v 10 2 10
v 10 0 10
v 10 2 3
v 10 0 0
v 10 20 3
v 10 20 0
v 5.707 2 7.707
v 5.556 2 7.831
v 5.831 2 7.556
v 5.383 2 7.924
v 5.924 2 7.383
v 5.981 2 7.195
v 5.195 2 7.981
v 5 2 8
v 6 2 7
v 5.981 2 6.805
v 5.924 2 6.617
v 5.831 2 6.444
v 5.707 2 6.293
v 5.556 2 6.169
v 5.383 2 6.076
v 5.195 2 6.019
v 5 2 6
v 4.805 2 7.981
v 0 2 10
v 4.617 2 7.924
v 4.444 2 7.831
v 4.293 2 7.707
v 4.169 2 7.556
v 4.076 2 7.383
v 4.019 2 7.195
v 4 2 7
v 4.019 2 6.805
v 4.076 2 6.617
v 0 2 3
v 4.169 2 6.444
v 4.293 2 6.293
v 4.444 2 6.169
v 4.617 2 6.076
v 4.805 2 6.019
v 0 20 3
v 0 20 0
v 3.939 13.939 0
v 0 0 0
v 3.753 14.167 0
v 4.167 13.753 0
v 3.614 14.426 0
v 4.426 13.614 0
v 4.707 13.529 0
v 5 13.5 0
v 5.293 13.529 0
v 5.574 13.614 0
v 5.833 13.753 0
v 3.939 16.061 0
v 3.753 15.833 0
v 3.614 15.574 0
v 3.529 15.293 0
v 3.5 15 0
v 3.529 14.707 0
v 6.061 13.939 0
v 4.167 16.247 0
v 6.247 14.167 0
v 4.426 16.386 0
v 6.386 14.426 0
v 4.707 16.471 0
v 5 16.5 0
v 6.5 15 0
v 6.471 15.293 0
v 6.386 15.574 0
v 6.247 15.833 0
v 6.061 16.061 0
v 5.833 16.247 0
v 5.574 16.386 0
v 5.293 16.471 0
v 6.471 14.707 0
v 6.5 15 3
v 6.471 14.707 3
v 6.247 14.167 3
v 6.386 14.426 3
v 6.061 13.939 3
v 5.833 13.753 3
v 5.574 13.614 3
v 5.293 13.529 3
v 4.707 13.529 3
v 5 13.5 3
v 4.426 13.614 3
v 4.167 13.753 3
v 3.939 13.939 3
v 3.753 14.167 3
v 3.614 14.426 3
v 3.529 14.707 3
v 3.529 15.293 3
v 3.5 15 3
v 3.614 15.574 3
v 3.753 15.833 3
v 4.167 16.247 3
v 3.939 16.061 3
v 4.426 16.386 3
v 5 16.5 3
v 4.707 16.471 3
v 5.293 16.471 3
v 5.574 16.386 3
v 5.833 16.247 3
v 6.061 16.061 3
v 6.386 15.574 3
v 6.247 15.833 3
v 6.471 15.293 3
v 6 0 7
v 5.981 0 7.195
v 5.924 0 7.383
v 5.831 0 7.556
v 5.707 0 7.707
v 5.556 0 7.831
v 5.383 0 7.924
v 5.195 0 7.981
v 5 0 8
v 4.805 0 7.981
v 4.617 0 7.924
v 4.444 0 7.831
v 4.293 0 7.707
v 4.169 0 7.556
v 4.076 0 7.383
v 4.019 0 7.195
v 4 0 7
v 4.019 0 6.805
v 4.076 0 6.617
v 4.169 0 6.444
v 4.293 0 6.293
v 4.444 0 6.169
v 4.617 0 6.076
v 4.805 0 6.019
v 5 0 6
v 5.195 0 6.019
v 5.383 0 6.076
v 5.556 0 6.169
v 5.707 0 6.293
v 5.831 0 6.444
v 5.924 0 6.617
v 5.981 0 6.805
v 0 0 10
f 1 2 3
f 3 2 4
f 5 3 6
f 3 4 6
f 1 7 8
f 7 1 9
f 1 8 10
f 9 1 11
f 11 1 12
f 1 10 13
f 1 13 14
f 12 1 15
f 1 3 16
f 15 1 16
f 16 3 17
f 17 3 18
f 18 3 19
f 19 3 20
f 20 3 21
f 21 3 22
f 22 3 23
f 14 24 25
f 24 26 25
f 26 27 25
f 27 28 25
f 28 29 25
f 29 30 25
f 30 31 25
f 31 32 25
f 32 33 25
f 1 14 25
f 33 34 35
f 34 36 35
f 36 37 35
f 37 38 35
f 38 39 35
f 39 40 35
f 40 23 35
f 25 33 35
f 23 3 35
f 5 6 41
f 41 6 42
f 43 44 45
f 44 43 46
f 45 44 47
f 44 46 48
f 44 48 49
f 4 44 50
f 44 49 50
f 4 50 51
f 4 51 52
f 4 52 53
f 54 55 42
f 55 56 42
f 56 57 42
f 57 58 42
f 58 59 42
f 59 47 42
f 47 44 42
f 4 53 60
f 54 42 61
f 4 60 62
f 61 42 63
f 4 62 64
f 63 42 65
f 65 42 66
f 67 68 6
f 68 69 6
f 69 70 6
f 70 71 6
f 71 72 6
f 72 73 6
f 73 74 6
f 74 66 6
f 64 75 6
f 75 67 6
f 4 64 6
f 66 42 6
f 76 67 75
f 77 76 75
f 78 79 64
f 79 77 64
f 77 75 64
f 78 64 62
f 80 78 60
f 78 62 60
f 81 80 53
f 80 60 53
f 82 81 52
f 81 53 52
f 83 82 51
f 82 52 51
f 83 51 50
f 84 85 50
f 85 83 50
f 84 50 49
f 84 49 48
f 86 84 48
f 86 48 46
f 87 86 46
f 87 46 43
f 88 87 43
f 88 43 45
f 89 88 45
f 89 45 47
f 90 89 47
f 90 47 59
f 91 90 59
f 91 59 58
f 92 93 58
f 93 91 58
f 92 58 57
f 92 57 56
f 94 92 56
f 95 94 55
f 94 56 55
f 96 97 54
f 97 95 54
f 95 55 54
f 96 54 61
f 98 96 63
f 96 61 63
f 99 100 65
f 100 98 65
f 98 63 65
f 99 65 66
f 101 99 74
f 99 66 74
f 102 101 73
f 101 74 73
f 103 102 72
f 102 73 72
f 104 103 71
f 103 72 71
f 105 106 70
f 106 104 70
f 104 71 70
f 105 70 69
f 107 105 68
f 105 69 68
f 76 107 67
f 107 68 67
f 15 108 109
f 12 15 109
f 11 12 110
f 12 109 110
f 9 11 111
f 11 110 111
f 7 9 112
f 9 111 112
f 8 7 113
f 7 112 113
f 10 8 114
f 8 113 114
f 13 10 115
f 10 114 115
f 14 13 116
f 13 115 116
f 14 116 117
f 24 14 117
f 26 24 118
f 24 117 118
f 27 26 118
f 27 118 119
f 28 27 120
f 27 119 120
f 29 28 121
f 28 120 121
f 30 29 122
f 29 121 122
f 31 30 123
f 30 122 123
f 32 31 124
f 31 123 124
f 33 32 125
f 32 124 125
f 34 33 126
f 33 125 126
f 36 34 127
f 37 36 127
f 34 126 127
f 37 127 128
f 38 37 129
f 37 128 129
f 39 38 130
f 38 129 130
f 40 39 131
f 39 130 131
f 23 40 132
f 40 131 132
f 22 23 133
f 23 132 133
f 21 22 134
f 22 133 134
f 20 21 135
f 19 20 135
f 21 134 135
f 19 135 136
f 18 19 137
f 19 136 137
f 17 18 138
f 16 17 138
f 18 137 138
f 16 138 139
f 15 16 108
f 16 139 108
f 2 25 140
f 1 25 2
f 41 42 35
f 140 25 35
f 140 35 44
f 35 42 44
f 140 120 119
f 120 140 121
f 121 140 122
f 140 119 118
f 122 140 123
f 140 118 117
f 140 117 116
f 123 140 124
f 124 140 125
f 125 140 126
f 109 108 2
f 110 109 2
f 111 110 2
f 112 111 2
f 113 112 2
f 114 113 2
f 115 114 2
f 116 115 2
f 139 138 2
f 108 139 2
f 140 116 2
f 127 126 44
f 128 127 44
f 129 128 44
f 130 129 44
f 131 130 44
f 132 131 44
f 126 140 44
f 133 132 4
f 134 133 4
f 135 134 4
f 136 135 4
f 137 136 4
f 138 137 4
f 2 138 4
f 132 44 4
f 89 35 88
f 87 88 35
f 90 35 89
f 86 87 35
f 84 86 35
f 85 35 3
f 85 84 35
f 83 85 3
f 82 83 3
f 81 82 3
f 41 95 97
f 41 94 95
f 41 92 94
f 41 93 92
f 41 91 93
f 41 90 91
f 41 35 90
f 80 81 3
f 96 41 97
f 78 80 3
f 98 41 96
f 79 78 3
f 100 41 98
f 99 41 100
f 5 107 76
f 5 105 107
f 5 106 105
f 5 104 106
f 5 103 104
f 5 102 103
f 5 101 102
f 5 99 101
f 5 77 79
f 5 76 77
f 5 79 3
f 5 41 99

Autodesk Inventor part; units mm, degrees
ref_plane "YZ Plane" through (0, 0, 0) normal (1, 0, 0) x (0, 1, 0)
ref_plane "XZ Plane" through (0, 0, 0) normal (0, 1, 0) x (-1, 0, 0)
ref_plane "XY Plane" through (0, 0, 0) normal (0, 0, 1) x (1, 0, 0)
sketch "Sketch1" plane through (0, 0, 0) normal (0, 0, 1) x (1, 0, 0)
  line L0 (0, 0) -> (10, 0)
  line L1 (10, 0) -> (10, 20)
  line L2 (10, 20) -> (0, 20)
  line L3 (0, 20) -> (0, 0)
  circle A0 centre (5, 15) radius 1.5
  dimension "d0" = 10
  dimension "d1" = 20
  dimension "d8" = 3
  dimension "d19" = 5
  dimension "d20" = 15
extrude "Extrusion1" add sketch "Sketch1" along normal blind 3
sketch "Sketch4" plane through (0, 0, 3) normal (0, 0, 1) x (1, 0, 0)
  line L0 (10, 0) -> (10, 20) projected
  line L1 (0, 0) -> (10, 0)
  line L2 (10, 0) -> (10, 2)
  line L3 (10, 2) -> (0, 2)
  line L4 (0, 2) -> (0, 0)
  dimension "d9" = 2
extrude "Extrusion2" add sketch "Sketch4" along normal blind 7
sketch "Sketch5" plane through (0, 0, 0) normal (0, -1, 0) x (1, 0, 0)
  circle A0 centre (5, 7) radius 1
  line L0 (10, 0) -> (10, 10) projected
  line L1 (0, 0) -> (0, 10) projected
  line L2 (0, 0) -> (10, 0) projected
  line L3 (0, 10) -> (10, 10) projected
  dimension "d12" = 10
  dimension "d13" = 10
  dimension "d14" = 7
  dimension "d15" = 5
  dimension "d16" = 2
extrude "Extrusion3" cut sketch "Sketch5" against normal through all contours A0
equation "\"d19\" = 0.5 * d0"
equation "\"d20\" = 0.75 * d1"
equation "\"d15\" = 0.5 * d12"
properties part number "supportPoulie" material "Stainless Steel"
